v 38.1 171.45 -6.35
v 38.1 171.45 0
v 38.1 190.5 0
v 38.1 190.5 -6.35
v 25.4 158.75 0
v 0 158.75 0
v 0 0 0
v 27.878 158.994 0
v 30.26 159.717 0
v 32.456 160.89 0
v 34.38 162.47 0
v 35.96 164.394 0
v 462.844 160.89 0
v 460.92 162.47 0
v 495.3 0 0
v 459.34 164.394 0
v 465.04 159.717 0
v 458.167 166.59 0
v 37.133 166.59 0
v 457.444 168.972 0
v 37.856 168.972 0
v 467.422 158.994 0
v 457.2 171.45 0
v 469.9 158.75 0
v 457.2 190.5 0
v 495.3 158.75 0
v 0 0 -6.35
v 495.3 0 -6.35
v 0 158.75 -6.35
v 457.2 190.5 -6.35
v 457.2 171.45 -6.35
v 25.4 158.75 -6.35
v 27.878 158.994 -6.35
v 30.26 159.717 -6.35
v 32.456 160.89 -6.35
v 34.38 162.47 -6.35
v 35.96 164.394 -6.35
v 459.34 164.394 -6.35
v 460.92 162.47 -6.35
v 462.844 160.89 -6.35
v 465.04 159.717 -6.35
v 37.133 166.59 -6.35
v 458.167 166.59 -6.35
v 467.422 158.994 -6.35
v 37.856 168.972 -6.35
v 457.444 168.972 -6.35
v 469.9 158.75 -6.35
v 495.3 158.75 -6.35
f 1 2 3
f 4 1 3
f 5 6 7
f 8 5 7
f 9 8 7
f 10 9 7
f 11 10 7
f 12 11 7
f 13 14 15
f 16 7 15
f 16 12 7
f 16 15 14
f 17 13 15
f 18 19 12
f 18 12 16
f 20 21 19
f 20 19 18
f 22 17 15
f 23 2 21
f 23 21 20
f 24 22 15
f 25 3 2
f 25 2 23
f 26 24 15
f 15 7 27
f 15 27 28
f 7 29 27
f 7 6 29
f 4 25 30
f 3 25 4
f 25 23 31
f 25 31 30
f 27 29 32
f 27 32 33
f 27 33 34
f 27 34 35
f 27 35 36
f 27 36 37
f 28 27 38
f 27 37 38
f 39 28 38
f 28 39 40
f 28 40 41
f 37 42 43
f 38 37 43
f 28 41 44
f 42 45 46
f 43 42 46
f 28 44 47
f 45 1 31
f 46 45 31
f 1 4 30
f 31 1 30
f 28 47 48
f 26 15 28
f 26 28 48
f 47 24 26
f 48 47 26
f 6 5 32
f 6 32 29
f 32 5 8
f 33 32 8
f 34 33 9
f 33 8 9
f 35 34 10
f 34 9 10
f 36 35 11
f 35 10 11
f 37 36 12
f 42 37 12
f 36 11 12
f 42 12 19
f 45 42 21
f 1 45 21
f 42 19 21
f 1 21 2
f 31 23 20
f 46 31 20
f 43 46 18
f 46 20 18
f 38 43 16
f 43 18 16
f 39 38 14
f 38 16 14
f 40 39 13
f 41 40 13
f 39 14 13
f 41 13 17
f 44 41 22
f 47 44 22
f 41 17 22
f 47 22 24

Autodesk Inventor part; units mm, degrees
ref_plane "YZ Plane" through (0, 0, 0) normal (1, 0, 0) x (0, 1, 0)
ref_plane "XZ Plane" through (0, 0, 0) normal (0, 1, 0) x (-1, 0, 0)
ref_plane "XY Plane" through (0, 0, 0) normal (0, 0, 1) x (1, 0, 0)
sketch "Sketch1" plane through (0, 0, 0) normal (0, 0, 1) x (1, 0, 0)
  line L0 (0, 0) -> (495.3, 0)
  line L1 (495.3, 0) -> (495.3, 158.75)
  line L2 (495.3, 190.5) -> (457.2, 190.5) construction
  line L3 (0, 190.5) -> (0, 158.75) construction
  arc A0 (25.4, 158.75) -> (38.1, 171.45) centre (25.4, 171.45) ccw
  arc A1 (457.2, 171.45) -> (469.9, 158.75) centre (469.9, 171.45) ccw
  line L4 (25.4, 158.75) -> (0, 158.75)
  line L5 (38.1, 171.45) -> (38.1, 190.5)
  line L6 (469.9, 158.75) -> (495.3, 158.75)
  line L7 (457.2, 171.45) -> (457.2, 190.5)
  line L8 (38.1, 190.5) -> (0, 190.5) construction
  line L9 (0, 158.75) -> (0, 0)
  line L10 (457.2, 190.5) -> (38.1, 190.5)
  line L11 (495.3, 158.75) -> (495.3, 190.5) construction
  dimension "d0" = 190.5
  dimension "d1" = 495.3
  dimension "d4" = 25.4
  dimension "d5" = 25.4
  dimension "d6" = 25.4
  dimension "d7" = 19.05
  dimension "d8" = 25.4
  dimension "d9" = 19.05
extrude "Extrusion1" add sketch "Sketch1" against normal blind 6.35
equation "\"d5\" = d4"
equation "\"d8\" = d6"
equation "\"d9\" = d7"
properties part number "manipulator side pannel"
